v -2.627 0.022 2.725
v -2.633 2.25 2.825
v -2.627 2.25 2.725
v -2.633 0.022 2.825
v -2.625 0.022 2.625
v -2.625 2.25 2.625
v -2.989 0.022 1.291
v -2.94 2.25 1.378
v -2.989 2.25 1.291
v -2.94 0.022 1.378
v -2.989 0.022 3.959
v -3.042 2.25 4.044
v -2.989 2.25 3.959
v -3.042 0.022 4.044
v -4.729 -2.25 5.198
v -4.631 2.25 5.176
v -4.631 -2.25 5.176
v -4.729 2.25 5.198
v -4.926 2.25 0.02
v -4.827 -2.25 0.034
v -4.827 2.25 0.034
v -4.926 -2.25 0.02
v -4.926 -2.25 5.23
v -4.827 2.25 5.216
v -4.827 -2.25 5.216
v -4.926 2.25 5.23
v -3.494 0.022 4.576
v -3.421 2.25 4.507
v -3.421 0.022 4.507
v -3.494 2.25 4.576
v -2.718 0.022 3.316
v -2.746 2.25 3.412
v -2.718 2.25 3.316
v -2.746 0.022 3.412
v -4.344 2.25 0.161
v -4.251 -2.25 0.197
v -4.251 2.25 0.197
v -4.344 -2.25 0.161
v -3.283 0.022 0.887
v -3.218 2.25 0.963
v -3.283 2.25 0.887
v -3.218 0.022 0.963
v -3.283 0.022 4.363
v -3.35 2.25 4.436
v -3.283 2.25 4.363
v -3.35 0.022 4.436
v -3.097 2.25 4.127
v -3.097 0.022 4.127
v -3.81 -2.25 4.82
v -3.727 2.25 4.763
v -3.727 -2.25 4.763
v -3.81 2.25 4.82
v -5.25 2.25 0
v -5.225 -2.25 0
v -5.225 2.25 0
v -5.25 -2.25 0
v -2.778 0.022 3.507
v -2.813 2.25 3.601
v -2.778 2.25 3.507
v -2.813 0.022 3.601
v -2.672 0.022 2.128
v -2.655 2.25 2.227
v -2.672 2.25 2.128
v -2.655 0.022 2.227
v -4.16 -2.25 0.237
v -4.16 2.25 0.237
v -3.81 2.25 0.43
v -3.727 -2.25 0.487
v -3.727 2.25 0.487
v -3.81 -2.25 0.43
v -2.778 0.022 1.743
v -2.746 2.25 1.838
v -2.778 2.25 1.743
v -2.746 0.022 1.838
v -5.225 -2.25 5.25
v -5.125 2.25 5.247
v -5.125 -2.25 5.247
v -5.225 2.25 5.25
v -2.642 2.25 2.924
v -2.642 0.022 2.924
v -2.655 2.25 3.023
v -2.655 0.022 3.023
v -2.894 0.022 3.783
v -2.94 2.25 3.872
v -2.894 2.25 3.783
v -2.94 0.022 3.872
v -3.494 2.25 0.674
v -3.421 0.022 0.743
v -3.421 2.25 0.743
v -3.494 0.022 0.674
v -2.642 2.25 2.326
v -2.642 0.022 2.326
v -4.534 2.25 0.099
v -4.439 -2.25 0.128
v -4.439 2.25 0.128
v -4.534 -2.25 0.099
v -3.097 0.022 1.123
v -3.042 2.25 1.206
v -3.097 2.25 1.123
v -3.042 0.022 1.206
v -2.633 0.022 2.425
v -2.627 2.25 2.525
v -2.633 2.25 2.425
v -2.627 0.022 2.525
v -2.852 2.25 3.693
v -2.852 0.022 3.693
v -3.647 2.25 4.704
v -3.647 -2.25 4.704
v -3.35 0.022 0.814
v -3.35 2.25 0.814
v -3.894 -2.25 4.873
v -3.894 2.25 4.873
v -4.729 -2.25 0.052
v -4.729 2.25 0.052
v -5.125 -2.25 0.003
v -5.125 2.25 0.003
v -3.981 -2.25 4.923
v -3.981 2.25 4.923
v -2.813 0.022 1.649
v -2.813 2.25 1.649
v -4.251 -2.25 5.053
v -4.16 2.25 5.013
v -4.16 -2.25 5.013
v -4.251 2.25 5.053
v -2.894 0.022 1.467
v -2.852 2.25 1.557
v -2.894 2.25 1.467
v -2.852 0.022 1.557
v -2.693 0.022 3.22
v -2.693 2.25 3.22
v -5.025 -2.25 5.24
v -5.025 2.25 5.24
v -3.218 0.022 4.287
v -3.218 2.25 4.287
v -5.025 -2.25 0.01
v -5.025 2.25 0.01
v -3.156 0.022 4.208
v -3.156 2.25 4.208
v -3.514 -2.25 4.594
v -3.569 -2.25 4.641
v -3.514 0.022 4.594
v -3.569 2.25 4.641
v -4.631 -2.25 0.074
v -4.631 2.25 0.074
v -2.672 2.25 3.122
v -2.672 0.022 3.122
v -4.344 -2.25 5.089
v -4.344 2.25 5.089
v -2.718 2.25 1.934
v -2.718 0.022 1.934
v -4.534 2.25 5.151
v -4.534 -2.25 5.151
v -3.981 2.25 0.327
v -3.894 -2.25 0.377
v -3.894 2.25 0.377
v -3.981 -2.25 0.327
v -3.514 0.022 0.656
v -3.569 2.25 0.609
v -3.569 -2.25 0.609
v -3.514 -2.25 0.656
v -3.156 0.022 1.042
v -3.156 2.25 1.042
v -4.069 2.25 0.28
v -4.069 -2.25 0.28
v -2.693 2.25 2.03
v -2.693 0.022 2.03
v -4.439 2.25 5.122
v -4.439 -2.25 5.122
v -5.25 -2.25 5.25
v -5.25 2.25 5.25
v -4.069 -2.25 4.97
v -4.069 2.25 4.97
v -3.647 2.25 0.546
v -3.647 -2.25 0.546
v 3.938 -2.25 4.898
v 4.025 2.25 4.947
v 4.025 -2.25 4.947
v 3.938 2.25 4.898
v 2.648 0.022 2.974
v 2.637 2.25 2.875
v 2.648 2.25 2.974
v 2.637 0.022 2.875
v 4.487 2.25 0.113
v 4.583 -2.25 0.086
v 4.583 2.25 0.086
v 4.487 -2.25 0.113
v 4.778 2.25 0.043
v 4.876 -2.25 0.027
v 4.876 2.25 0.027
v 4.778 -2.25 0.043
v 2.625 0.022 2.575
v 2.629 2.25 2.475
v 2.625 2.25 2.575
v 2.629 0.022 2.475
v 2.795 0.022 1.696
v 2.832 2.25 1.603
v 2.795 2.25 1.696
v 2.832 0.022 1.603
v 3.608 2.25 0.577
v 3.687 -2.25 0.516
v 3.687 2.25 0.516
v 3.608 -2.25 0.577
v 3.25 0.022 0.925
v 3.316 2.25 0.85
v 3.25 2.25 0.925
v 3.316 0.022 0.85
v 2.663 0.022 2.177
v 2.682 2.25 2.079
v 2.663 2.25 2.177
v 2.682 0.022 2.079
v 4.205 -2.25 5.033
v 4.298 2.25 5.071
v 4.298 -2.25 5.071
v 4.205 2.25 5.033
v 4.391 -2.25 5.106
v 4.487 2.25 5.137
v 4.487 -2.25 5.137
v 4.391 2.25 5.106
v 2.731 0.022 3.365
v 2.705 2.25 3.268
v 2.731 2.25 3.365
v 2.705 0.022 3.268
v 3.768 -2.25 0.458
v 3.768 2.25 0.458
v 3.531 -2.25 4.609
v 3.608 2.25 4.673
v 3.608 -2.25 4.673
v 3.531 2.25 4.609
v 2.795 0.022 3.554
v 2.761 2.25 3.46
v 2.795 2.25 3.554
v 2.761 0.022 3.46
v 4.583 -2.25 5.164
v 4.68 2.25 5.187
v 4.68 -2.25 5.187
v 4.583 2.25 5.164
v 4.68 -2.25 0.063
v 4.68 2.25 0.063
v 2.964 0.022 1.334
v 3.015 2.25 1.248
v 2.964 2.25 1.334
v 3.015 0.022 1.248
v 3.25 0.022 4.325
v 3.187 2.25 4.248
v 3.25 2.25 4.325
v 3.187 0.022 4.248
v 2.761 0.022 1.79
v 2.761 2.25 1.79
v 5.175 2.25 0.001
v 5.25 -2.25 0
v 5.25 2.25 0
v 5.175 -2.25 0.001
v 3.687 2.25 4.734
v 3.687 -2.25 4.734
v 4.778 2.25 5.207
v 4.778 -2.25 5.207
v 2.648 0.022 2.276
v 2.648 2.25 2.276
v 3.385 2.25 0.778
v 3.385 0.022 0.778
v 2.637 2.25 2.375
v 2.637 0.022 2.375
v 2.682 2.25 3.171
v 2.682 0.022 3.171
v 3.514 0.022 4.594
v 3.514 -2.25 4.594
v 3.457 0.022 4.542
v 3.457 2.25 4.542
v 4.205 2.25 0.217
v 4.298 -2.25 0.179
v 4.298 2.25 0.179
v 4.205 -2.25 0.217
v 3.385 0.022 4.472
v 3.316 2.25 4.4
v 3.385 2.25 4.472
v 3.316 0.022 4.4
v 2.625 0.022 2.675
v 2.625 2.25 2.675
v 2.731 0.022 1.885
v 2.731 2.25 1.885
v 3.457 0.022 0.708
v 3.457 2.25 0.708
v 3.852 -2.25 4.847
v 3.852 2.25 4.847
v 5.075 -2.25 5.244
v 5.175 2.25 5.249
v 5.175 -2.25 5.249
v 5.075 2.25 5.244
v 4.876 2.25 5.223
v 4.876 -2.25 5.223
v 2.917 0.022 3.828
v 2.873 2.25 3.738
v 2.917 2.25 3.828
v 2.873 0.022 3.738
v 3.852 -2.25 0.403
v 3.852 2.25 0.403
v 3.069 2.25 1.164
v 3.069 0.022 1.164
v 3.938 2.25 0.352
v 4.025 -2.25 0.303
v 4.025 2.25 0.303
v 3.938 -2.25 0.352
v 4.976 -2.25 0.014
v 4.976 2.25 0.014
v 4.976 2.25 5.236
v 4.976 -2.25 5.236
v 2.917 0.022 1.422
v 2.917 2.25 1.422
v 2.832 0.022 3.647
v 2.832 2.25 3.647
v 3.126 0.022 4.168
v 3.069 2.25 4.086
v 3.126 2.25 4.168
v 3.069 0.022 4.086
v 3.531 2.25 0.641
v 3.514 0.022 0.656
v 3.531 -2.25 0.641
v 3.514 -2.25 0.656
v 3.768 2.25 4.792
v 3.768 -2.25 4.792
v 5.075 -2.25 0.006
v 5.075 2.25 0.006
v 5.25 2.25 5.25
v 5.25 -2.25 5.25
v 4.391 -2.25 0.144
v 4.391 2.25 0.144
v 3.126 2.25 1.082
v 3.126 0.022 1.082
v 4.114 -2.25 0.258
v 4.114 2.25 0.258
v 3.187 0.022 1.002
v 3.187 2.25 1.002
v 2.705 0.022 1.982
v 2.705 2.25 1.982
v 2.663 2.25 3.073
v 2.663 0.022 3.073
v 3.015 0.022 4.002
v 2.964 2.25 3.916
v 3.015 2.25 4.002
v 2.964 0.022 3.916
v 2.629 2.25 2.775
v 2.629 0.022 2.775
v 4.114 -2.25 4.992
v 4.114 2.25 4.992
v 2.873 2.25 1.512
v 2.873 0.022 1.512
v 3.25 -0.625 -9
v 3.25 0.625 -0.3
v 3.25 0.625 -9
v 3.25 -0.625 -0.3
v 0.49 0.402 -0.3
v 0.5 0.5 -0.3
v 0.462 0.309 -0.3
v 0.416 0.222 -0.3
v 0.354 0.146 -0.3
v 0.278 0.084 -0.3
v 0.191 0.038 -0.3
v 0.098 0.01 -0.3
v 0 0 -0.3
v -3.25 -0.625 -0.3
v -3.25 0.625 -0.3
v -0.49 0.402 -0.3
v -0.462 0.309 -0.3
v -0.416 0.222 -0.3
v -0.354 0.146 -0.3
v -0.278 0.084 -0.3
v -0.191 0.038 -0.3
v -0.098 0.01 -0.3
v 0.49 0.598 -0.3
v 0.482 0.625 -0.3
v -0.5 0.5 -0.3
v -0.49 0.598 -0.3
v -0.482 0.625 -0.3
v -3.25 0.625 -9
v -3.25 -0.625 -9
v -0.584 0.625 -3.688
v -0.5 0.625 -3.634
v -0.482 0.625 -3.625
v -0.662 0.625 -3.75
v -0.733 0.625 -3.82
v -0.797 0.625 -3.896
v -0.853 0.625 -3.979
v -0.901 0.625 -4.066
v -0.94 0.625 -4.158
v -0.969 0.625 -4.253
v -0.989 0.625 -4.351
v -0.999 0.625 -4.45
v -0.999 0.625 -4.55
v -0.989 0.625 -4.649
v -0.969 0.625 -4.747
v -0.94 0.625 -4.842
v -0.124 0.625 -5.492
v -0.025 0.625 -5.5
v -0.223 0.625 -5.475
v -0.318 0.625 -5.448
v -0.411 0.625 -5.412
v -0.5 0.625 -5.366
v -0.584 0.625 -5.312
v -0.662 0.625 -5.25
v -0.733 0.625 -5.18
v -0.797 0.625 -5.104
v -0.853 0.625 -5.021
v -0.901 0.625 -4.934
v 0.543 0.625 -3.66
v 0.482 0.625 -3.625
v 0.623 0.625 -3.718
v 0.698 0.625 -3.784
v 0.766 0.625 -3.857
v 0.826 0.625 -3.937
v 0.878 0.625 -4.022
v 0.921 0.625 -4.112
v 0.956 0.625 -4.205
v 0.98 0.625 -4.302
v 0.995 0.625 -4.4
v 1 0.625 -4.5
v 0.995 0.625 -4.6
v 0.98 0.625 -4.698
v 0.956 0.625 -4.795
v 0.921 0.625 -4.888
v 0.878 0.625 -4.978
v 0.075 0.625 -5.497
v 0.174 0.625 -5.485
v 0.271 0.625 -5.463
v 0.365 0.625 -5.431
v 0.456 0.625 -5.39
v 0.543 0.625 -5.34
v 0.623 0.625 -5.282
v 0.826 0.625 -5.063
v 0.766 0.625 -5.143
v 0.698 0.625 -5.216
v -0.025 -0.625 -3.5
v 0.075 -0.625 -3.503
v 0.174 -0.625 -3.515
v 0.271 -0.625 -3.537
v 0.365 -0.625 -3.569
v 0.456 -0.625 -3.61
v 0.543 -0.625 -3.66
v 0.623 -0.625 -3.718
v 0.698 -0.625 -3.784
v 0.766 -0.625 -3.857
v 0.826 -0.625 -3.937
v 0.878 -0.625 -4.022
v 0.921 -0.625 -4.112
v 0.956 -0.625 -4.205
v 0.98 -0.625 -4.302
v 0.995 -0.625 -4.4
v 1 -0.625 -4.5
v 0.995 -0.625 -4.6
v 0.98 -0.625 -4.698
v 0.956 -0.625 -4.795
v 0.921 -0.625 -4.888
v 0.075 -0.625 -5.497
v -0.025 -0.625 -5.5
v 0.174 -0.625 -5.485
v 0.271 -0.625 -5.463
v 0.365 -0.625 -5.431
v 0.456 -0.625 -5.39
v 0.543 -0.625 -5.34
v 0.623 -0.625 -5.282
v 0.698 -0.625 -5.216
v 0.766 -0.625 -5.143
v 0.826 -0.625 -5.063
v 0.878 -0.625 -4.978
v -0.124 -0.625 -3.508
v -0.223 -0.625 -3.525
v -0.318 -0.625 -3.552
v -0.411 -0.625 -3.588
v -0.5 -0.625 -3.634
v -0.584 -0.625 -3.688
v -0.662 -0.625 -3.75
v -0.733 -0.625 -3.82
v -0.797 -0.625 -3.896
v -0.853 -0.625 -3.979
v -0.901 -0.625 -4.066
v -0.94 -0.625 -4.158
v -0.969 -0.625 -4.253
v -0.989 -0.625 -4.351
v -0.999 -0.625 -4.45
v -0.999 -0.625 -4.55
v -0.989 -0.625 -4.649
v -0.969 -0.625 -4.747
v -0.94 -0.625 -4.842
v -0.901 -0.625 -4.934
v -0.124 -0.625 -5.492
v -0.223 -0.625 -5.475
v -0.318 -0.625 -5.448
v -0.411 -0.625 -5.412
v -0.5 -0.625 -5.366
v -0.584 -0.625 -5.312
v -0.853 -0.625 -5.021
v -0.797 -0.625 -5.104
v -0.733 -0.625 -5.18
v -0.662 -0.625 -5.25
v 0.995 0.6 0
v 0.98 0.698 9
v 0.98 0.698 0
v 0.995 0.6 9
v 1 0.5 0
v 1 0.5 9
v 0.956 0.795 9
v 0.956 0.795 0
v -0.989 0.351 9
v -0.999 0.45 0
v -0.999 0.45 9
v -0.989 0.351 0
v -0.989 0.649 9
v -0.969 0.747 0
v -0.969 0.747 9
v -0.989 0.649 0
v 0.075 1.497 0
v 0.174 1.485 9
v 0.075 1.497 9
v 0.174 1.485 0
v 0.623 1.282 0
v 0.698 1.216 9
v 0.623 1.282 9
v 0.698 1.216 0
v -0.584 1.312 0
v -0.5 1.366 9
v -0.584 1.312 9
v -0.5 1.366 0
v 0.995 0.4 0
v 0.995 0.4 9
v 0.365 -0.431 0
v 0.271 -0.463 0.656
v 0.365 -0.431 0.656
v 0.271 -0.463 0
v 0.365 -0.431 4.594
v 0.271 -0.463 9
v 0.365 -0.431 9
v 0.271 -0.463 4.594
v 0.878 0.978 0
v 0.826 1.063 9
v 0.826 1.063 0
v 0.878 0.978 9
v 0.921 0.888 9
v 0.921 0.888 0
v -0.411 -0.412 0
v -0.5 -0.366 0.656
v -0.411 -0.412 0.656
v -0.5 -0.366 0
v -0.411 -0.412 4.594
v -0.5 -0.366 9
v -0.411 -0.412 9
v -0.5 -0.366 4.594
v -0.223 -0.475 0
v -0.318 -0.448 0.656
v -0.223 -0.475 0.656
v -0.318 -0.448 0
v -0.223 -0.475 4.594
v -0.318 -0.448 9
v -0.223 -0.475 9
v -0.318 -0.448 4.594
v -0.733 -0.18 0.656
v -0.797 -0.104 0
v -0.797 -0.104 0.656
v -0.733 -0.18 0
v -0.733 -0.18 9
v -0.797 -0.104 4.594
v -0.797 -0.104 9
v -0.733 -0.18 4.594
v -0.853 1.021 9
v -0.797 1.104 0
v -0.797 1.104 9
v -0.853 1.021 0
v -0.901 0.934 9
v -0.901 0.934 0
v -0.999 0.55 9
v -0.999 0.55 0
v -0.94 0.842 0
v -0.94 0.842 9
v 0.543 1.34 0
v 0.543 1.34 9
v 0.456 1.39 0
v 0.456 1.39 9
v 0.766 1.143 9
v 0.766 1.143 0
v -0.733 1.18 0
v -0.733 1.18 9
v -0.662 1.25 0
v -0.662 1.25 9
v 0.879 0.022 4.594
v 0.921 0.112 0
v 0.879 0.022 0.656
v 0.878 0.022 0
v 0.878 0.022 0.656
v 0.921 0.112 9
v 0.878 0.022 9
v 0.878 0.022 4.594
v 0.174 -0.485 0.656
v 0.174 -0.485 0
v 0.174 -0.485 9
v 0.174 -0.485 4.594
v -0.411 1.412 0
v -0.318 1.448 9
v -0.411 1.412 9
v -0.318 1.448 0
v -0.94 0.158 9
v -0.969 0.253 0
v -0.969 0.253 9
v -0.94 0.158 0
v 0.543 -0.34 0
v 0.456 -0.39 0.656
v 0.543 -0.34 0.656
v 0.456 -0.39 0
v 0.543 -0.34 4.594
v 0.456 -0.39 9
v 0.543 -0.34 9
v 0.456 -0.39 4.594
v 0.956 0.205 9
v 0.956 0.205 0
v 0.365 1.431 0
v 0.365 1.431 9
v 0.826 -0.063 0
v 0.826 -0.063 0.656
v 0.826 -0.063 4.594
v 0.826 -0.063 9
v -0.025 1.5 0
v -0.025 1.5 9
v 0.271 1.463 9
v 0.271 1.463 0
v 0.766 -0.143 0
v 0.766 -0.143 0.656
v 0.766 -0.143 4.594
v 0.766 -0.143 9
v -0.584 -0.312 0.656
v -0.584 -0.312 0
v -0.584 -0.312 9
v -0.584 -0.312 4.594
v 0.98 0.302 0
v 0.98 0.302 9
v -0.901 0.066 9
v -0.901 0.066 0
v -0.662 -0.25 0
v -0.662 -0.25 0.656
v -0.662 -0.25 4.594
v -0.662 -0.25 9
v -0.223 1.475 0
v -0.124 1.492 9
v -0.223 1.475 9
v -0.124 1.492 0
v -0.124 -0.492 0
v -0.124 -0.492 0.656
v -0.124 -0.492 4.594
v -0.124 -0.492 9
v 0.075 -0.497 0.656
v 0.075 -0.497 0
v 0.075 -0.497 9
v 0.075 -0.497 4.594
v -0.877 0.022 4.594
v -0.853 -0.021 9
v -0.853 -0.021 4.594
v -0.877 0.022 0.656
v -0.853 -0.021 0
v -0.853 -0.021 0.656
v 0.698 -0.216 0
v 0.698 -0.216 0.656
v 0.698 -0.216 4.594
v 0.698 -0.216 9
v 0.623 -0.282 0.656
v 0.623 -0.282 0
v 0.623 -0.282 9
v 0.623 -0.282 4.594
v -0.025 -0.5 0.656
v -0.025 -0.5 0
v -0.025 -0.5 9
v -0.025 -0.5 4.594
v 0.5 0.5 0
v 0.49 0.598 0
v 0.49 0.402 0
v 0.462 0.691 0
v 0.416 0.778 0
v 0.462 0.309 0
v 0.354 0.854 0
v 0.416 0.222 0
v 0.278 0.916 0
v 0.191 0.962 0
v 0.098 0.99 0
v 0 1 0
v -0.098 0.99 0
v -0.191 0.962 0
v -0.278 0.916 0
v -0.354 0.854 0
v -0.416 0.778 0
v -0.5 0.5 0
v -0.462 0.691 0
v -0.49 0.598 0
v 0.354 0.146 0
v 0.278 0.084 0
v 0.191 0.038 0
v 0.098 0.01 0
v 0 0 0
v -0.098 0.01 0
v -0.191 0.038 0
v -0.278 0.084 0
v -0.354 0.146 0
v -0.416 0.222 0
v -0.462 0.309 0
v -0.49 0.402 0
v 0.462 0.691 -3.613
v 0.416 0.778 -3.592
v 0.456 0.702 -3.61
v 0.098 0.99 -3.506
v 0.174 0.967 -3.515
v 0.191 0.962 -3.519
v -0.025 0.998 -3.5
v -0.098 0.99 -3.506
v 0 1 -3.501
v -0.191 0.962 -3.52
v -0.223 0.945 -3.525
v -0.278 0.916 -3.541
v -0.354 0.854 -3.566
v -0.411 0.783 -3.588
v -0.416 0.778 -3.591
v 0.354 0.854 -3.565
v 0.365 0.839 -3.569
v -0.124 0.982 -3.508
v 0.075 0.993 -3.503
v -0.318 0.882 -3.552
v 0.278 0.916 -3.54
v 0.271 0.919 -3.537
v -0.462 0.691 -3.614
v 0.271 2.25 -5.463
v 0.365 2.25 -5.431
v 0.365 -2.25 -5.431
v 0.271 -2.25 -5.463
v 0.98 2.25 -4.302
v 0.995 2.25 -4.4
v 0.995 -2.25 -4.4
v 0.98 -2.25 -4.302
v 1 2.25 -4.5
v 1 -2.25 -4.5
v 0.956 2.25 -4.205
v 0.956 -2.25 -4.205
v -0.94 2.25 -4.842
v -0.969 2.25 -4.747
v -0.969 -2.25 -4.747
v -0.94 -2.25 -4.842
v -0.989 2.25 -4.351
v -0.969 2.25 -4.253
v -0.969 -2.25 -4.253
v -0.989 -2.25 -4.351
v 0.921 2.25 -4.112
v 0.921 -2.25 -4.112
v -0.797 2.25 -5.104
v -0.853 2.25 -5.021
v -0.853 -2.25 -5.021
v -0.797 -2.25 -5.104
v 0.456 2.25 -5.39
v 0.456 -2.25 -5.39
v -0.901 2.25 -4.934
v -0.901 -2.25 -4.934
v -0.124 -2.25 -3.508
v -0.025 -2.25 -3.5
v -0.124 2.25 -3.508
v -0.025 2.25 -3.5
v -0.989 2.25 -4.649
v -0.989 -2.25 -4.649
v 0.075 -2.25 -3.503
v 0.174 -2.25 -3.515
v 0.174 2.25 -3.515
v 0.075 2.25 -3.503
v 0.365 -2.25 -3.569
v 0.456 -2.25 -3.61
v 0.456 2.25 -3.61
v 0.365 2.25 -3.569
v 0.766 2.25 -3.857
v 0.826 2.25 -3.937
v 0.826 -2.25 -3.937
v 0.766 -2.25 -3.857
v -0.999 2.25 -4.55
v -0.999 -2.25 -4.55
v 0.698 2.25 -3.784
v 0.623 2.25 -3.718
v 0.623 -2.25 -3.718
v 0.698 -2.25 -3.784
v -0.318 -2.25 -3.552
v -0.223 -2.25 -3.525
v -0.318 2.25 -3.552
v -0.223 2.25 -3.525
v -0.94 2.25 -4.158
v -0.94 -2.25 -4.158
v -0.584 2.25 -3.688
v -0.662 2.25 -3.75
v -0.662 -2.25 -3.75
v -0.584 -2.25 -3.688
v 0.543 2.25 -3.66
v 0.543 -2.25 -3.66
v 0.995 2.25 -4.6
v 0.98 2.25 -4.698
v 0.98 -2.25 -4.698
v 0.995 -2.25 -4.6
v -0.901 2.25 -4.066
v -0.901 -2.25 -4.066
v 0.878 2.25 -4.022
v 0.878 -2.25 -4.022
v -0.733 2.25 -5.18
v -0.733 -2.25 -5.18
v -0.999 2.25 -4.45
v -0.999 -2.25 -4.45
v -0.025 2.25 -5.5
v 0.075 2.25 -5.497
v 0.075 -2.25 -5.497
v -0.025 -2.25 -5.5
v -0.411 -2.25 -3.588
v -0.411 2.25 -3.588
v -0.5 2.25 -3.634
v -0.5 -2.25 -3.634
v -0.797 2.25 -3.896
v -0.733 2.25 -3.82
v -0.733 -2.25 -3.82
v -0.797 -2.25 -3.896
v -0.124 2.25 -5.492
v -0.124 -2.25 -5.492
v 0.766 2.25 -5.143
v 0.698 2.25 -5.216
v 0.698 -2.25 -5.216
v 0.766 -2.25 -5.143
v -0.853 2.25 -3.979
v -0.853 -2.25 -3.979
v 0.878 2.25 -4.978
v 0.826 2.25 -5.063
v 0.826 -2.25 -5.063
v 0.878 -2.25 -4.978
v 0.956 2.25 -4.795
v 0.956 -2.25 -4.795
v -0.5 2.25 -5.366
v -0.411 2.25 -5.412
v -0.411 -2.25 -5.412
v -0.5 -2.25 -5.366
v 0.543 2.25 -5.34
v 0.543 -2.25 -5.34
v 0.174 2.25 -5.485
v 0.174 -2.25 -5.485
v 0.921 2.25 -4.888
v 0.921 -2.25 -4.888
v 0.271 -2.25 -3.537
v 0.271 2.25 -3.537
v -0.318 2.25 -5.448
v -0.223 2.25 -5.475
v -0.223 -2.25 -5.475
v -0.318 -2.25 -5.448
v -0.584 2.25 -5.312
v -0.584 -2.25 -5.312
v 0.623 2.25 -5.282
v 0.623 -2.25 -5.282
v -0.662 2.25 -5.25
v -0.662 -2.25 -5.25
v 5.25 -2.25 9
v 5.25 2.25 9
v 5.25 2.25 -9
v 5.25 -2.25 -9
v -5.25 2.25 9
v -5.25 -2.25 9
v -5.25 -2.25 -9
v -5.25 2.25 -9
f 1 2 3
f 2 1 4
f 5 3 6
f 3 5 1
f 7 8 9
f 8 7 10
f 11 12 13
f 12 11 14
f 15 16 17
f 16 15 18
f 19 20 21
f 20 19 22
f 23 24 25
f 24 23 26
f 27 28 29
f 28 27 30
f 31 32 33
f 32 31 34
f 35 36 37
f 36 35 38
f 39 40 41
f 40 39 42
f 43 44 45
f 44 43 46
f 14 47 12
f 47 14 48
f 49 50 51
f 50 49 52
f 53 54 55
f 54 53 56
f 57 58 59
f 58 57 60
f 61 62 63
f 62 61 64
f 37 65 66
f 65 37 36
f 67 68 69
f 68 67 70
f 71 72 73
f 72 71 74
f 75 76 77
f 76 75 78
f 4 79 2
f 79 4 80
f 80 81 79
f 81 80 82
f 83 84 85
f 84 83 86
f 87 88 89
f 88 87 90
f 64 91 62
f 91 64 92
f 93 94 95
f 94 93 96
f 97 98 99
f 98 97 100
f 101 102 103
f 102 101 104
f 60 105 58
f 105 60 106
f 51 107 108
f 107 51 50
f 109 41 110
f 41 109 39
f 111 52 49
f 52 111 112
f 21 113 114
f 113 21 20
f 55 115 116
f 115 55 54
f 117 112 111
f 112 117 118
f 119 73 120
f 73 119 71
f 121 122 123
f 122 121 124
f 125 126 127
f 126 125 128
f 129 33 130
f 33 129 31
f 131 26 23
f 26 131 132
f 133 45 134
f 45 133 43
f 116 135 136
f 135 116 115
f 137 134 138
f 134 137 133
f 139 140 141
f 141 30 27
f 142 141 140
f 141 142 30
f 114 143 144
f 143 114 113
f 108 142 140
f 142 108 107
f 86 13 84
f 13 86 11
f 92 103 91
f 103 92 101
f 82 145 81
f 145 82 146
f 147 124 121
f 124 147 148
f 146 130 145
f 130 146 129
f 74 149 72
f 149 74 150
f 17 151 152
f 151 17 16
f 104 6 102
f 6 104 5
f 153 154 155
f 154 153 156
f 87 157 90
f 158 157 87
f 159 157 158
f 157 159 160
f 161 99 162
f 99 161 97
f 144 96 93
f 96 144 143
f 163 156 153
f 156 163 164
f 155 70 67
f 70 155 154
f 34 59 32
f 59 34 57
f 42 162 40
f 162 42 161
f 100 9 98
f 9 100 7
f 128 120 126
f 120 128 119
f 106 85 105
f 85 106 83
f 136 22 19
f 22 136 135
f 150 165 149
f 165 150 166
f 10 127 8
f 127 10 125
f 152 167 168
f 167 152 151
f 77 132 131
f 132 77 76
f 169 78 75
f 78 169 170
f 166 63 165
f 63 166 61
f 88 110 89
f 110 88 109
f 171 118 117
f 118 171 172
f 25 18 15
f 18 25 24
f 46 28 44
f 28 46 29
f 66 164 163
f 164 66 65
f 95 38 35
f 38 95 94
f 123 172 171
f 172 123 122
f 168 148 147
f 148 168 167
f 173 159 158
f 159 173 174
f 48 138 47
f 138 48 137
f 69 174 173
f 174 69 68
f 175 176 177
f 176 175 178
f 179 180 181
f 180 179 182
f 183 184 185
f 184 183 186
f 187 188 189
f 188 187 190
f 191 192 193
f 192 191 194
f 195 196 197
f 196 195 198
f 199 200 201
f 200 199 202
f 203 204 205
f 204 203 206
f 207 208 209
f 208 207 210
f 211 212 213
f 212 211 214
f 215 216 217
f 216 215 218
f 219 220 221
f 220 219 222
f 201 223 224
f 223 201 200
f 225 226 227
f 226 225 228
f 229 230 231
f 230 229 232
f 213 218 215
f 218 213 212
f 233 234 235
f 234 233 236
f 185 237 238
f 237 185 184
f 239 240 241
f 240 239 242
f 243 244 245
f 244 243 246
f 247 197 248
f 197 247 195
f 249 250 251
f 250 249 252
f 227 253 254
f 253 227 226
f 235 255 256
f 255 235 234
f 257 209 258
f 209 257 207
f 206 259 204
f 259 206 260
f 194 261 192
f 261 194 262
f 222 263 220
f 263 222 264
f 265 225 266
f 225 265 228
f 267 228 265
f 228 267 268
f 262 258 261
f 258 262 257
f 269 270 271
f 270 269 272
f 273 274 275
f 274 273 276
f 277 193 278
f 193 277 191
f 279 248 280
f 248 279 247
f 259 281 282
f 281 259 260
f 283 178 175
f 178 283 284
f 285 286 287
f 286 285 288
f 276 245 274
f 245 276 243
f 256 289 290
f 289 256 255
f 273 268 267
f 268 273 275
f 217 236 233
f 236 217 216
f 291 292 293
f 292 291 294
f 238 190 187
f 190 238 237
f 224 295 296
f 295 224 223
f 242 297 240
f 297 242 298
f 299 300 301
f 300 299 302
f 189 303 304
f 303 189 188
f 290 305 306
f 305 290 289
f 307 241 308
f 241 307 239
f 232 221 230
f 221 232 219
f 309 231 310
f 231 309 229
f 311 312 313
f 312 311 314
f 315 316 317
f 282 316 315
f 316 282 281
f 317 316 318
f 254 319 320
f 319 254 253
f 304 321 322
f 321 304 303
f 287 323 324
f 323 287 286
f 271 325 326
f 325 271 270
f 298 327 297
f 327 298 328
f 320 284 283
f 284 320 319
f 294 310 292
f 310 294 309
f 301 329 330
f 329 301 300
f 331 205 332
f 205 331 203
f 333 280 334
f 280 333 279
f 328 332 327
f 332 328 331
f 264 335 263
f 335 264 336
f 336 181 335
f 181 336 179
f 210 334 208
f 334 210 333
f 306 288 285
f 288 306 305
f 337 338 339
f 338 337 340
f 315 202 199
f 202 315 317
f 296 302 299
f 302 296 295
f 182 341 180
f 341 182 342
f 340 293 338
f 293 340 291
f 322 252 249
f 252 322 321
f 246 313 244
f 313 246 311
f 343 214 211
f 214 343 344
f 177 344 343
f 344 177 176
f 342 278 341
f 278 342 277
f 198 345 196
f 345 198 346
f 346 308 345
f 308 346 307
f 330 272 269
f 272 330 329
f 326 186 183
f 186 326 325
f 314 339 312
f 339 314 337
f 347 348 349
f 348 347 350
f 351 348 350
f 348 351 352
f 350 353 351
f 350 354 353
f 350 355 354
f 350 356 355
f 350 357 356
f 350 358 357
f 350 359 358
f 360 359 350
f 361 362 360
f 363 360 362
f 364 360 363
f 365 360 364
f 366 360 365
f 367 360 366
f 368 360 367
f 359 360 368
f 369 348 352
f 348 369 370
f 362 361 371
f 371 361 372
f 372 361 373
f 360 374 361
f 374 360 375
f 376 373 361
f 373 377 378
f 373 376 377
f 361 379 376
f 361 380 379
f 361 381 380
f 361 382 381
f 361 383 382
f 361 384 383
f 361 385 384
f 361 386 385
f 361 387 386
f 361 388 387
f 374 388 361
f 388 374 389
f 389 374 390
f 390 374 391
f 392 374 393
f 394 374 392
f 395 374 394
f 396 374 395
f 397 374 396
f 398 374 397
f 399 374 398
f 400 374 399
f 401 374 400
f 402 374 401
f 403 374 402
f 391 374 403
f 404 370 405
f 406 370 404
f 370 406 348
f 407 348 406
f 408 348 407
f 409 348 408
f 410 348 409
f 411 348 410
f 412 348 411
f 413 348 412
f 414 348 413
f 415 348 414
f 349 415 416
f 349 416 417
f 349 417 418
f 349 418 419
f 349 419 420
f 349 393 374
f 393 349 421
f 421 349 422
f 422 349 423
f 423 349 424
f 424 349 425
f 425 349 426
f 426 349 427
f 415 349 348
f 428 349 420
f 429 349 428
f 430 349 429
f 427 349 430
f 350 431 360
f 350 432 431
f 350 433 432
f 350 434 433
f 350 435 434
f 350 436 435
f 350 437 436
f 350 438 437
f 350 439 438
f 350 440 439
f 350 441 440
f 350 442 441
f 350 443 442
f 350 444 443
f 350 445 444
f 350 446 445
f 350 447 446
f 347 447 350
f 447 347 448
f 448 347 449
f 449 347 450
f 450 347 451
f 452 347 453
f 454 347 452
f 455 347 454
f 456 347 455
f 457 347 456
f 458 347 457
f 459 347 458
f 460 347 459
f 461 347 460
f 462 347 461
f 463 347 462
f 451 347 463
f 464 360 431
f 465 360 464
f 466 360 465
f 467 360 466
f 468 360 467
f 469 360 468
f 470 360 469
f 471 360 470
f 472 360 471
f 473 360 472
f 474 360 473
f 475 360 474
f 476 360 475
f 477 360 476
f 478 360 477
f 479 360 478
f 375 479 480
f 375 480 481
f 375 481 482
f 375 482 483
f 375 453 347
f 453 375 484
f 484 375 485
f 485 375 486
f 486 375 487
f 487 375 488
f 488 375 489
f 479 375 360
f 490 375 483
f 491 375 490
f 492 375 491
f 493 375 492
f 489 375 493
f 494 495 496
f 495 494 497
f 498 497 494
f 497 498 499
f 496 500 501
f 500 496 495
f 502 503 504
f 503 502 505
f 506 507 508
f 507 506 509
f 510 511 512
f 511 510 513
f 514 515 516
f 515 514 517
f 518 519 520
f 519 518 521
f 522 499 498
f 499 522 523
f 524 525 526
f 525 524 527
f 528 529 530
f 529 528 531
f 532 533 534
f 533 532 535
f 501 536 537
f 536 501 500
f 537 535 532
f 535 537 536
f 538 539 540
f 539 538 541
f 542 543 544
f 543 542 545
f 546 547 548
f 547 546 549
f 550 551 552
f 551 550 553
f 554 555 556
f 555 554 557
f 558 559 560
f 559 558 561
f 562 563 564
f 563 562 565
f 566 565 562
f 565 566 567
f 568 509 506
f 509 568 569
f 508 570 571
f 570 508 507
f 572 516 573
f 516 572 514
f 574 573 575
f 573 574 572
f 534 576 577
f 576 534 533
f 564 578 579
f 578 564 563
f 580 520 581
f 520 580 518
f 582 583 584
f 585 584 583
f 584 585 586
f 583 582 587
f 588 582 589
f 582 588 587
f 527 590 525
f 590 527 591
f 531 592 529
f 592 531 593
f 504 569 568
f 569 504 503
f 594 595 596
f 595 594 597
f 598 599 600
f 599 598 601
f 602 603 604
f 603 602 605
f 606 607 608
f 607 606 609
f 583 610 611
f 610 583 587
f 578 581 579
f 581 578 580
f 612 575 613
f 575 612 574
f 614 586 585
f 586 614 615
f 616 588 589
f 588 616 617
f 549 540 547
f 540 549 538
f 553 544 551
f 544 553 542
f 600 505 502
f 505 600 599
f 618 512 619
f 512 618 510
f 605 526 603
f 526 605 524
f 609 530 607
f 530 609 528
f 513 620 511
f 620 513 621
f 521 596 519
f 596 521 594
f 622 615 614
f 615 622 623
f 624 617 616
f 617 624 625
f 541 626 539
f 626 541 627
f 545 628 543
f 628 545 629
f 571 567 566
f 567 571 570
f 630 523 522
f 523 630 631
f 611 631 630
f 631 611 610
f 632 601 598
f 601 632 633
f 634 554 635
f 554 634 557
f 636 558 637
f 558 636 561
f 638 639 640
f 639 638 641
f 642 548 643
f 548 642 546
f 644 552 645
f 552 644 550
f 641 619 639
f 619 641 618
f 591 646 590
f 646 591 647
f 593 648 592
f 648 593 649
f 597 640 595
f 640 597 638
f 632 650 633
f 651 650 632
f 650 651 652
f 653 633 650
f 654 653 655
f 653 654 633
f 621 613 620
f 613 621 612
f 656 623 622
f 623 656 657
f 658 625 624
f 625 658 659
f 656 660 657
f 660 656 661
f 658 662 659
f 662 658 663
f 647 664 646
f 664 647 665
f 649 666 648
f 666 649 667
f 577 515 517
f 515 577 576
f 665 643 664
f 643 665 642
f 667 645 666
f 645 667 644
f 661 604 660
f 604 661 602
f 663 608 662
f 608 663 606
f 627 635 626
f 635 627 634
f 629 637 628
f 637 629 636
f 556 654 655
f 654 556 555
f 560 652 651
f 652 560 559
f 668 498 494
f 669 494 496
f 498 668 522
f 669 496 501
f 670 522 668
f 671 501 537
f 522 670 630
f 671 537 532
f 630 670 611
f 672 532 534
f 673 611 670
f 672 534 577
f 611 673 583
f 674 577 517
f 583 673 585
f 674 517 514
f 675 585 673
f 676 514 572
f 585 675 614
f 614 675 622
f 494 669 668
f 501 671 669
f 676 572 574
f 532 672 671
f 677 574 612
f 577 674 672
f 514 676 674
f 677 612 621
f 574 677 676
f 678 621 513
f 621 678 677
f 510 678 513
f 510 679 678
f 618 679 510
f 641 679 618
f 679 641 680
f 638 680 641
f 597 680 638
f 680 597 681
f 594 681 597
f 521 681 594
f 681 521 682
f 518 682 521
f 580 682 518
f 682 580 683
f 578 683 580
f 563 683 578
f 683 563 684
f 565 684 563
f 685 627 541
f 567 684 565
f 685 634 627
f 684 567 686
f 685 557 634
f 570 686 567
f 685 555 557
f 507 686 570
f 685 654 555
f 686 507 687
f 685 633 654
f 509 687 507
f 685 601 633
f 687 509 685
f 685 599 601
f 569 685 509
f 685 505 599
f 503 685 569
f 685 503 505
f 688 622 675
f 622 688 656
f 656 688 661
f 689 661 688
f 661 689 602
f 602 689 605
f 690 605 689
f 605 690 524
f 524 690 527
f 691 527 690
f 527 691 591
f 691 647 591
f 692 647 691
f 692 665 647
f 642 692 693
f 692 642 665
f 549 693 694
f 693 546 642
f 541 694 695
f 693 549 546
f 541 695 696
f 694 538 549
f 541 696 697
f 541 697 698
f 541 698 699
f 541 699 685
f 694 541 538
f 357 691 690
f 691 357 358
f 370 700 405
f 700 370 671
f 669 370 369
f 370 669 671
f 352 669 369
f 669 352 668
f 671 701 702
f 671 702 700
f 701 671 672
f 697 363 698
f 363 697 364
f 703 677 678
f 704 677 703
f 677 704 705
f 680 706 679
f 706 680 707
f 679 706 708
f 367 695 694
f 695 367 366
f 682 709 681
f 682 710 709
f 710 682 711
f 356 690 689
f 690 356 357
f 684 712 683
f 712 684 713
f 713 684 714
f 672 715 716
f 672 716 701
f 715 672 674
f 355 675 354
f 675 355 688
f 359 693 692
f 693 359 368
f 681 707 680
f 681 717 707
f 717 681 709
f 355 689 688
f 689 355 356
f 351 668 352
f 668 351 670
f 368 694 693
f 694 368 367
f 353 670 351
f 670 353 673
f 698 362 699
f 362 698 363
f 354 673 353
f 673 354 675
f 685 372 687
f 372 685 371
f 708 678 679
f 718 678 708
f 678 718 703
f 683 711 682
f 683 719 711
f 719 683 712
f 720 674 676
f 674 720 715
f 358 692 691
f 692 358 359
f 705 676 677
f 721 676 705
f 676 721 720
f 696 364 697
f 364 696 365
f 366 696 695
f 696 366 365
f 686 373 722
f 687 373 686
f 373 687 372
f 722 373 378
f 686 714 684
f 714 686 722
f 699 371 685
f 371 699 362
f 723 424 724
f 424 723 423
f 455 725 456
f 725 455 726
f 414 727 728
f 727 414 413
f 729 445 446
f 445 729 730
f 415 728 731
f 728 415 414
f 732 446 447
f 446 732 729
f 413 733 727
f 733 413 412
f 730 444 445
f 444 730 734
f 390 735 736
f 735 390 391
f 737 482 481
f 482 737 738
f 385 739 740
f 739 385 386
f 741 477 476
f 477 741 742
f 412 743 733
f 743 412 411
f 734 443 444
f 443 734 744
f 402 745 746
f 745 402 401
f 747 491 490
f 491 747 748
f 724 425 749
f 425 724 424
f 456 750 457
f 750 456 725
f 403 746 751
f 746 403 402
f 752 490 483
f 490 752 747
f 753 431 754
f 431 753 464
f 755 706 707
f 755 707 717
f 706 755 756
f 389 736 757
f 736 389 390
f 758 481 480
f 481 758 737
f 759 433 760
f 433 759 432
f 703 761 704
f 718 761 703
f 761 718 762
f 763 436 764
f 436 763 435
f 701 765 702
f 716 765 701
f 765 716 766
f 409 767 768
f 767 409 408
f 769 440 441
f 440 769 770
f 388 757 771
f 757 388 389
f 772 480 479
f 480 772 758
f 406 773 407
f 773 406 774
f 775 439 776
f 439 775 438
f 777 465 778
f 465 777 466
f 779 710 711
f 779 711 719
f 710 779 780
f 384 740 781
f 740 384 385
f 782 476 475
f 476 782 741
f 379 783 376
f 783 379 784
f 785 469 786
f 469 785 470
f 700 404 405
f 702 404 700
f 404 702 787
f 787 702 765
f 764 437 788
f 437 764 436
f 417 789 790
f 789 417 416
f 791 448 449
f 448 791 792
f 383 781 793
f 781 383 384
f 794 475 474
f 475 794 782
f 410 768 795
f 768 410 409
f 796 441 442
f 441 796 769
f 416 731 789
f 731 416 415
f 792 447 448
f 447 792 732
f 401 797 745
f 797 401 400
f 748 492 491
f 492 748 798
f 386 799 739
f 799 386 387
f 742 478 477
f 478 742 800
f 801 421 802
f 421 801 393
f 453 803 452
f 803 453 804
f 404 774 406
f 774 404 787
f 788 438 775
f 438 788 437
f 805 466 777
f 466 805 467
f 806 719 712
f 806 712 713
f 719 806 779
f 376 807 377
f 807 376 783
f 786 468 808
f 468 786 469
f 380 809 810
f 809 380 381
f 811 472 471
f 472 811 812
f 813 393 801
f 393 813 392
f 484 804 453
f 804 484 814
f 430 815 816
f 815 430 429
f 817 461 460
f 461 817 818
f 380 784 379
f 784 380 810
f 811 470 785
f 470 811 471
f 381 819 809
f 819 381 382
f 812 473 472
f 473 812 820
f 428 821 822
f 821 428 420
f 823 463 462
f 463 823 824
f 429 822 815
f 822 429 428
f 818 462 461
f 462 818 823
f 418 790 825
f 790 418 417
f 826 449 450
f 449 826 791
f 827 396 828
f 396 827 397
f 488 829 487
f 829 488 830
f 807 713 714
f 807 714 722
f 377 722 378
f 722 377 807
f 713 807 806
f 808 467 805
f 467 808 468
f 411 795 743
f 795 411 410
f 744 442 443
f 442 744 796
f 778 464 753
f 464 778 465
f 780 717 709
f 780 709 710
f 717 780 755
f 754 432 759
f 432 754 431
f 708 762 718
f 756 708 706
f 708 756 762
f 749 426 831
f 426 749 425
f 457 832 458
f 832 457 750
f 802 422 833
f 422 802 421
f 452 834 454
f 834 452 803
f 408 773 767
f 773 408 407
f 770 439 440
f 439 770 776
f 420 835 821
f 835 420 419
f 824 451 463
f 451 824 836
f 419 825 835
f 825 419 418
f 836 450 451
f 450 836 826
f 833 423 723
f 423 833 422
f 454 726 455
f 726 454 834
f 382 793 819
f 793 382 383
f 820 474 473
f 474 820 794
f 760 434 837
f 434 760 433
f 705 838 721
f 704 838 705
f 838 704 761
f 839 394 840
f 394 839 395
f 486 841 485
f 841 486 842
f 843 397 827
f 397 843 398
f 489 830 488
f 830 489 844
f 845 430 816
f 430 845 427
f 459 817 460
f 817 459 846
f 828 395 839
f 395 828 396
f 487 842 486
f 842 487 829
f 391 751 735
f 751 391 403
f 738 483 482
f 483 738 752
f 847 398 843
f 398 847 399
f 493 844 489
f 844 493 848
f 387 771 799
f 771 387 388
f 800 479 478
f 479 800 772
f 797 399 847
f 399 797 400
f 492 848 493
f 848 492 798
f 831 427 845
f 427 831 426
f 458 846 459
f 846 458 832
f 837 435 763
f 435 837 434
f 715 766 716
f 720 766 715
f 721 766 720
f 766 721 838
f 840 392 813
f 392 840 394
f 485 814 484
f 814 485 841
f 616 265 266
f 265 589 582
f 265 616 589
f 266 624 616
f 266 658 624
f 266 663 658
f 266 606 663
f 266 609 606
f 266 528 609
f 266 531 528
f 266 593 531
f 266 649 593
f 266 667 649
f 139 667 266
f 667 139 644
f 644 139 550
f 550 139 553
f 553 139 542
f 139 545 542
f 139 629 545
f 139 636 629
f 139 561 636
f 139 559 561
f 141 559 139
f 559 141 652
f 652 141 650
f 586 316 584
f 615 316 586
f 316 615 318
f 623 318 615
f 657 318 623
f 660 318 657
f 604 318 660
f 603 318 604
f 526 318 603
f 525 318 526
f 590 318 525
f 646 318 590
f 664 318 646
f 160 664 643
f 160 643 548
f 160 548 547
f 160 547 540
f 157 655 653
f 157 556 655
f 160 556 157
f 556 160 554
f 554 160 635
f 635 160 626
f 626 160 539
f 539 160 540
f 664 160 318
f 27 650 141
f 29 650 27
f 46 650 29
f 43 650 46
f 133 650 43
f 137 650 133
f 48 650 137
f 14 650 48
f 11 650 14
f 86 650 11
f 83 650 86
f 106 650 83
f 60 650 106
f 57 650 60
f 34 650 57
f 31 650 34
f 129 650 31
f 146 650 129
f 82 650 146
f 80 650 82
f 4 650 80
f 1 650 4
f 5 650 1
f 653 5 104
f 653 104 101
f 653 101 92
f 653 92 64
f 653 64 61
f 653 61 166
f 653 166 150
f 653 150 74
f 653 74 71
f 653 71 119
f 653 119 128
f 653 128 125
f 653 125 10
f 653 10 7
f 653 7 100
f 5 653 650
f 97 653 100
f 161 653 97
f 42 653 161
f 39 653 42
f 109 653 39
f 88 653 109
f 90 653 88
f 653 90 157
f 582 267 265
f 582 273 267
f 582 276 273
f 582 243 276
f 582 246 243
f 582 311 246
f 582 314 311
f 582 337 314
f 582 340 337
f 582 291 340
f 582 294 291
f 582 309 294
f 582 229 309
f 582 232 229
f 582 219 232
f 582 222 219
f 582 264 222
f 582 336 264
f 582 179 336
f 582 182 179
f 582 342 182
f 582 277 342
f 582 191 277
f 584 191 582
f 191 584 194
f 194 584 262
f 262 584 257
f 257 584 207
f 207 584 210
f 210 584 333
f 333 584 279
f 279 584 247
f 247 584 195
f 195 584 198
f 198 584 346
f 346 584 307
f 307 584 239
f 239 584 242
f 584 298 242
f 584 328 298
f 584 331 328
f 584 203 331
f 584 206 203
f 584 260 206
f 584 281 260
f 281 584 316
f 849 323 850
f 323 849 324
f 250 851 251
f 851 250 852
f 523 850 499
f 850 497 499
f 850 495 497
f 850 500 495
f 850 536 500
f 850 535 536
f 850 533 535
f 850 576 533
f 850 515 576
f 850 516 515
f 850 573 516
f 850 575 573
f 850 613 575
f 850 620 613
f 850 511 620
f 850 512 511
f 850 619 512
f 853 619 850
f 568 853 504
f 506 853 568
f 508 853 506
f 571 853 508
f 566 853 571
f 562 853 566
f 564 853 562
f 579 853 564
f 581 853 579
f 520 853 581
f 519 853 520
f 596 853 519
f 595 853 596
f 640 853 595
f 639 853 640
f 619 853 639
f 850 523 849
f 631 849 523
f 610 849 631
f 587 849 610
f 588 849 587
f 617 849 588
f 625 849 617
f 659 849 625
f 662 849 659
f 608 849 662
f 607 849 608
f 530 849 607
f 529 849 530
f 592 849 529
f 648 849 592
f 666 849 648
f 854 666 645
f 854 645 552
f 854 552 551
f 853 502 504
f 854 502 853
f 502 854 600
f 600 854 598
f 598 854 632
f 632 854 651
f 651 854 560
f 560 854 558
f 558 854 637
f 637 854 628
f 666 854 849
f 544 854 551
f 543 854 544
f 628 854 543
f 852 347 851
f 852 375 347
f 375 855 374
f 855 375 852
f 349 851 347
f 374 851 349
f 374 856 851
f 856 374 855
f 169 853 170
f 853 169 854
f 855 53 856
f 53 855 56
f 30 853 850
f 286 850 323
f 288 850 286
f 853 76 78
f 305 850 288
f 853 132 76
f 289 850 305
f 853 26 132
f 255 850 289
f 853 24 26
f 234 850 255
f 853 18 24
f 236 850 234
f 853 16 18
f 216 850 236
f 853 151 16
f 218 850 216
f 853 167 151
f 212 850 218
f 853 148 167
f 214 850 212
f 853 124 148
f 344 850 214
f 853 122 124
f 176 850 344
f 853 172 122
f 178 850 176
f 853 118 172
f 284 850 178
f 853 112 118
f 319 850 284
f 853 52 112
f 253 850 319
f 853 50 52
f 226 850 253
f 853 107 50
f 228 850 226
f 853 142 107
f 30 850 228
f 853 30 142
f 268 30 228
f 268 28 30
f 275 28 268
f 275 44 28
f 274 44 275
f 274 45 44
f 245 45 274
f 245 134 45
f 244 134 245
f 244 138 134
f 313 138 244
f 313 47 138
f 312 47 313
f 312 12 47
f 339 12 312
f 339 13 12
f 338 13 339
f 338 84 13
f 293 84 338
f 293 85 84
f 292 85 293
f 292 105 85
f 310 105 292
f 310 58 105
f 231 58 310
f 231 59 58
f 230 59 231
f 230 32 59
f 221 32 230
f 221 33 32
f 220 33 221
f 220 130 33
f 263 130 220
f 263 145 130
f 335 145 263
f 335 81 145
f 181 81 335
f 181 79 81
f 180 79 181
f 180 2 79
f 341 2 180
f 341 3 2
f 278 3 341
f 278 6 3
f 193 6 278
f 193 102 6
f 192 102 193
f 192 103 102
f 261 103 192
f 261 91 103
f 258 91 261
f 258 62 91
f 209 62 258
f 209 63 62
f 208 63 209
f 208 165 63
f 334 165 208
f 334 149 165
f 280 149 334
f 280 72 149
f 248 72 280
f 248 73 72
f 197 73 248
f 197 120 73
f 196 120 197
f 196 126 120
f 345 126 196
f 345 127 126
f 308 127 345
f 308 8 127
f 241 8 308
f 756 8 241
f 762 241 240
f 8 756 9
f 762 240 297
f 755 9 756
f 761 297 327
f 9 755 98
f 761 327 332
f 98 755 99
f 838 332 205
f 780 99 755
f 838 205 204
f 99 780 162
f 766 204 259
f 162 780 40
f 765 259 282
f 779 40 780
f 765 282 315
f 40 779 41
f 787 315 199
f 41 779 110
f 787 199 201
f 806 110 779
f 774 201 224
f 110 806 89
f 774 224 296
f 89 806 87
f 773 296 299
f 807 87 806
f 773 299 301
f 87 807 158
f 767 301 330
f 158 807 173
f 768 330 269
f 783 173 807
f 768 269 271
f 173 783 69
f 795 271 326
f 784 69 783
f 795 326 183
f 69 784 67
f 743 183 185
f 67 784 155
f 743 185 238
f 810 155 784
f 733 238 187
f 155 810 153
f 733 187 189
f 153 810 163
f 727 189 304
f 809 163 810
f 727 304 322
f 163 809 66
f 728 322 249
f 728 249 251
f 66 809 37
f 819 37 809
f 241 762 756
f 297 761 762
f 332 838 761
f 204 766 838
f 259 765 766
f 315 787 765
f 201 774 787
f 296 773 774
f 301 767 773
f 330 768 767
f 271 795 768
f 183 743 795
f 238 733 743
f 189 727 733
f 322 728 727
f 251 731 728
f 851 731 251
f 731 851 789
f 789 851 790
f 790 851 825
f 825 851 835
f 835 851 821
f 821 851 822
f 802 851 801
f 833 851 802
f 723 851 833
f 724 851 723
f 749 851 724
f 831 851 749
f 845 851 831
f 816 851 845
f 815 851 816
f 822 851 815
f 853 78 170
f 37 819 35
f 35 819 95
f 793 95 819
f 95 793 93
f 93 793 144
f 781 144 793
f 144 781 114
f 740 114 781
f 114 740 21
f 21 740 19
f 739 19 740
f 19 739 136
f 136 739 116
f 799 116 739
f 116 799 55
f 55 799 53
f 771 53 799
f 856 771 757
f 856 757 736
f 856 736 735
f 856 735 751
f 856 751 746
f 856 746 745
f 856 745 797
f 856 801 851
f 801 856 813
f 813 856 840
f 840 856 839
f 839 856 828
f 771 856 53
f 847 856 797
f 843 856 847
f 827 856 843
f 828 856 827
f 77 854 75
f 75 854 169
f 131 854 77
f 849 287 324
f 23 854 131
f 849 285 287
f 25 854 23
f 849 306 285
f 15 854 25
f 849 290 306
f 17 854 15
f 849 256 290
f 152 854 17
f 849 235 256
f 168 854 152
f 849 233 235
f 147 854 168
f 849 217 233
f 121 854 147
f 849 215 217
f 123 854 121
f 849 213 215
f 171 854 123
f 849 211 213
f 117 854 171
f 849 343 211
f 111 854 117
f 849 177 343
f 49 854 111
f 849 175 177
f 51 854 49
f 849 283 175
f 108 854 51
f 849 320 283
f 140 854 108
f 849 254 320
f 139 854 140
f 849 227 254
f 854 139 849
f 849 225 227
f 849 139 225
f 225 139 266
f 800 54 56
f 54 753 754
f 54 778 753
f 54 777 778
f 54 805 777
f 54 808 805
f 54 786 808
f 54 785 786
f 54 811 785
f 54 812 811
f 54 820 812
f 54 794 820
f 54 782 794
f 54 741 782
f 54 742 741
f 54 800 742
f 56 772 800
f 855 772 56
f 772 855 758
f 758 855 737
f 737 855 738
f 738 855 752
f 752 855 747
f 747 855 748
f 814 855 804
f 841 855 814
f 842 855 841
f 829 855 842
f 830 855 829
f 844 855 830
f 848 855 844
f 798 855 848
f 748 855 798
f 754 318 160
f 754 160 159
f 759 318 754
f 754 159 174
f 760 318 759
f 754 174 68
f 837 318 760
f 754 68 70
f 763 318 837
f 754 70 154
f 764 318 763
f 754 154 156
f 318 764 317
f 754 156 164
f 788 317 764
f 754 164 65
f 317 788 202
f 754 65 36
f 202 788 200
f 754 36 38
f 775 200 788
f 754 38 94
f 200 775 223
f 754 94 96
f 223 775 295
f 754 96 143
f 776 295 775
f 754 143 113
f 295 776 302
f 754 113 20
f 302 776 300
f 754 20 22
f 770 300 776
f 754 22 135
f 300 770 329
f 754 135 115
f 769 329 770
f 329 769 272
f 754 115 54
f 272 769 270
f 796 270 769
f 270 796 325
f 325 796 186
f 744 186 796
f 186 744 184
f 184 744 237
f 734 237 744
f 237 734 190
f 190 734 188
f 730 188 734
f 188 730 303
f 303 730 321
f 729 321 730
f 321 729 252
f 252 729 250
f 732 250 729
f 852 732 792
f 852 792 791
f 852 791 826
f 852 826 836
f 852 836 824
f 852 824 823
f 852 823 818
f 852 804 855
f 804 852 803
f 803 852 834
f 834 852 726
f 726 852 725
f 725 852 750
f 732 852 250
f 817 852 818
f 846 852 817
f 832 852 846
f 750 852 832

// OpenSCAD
$fn = 0; $fa = 0.1; $fs = .1;

// PARAMETERS //

// Spade Dimensions

sp_wid = 6.5;
sp_th  = 1;
sp_hi  = 9;

// Wire Dimensions

wr_rad = 1/2; // Unshielded radius
wr_sh  = 2/2; // Shielded radius

// Connector Envelope

cn_wid = 4*wr_sh  + sp_wid;
cn_hi = 2*sp_hi;
cn_th = 1.5*sp_th + 2*wr_sh + 2*wr_rad;

// Carving parameters

sh_rad = cn_wid/4; // Shoulder radius




// MODEL //

difference(){

// Connector Envelope
cube([ cn_wid, cn_th, cn_hi], center=true);

// Cut aways
union(){

   // Shoulders
   for(i=[0:1]){
   translate([ i*cn_wid - cn_wid/2, 0, sh_rad]){rotate([ 90, 0, 0]){cylinder( h=cn_th*1.1, r=sh_rad, center=true);}}
   }

   // Spade
   translate([ 0, 0, -0.5*cn_wid]){cube([ sp_wid, 1.25*sp_th, 1.1*sp_hi], center=true);}

   // Wire
   // Shielded
   translate([ 0, 0.5*wr_sh, .5*cn_hi,]){cylinder( h=cn_hi, r=wr_sh, center=true);}
   // Unshielded
   translate([ 0, wr_rad, -.125*cn_hi,]){cylinder( h=0.26*cn_hi, r=wr_rad, center=true);}

   // Through hole
   translate([ 0, 0, -0.25*cn_hi ]){rotate([ 90, 0, 0]){cylinder( h=1.1*cn_th, r=wr_sh, center=true);}}

   // Cabletie slot
   translate([ 0, -0.25*cn_th, sh_rad]){cube([ cn_wid, 0.51*cn_th, 1.5*sh_rad], center=true);}


}
}
